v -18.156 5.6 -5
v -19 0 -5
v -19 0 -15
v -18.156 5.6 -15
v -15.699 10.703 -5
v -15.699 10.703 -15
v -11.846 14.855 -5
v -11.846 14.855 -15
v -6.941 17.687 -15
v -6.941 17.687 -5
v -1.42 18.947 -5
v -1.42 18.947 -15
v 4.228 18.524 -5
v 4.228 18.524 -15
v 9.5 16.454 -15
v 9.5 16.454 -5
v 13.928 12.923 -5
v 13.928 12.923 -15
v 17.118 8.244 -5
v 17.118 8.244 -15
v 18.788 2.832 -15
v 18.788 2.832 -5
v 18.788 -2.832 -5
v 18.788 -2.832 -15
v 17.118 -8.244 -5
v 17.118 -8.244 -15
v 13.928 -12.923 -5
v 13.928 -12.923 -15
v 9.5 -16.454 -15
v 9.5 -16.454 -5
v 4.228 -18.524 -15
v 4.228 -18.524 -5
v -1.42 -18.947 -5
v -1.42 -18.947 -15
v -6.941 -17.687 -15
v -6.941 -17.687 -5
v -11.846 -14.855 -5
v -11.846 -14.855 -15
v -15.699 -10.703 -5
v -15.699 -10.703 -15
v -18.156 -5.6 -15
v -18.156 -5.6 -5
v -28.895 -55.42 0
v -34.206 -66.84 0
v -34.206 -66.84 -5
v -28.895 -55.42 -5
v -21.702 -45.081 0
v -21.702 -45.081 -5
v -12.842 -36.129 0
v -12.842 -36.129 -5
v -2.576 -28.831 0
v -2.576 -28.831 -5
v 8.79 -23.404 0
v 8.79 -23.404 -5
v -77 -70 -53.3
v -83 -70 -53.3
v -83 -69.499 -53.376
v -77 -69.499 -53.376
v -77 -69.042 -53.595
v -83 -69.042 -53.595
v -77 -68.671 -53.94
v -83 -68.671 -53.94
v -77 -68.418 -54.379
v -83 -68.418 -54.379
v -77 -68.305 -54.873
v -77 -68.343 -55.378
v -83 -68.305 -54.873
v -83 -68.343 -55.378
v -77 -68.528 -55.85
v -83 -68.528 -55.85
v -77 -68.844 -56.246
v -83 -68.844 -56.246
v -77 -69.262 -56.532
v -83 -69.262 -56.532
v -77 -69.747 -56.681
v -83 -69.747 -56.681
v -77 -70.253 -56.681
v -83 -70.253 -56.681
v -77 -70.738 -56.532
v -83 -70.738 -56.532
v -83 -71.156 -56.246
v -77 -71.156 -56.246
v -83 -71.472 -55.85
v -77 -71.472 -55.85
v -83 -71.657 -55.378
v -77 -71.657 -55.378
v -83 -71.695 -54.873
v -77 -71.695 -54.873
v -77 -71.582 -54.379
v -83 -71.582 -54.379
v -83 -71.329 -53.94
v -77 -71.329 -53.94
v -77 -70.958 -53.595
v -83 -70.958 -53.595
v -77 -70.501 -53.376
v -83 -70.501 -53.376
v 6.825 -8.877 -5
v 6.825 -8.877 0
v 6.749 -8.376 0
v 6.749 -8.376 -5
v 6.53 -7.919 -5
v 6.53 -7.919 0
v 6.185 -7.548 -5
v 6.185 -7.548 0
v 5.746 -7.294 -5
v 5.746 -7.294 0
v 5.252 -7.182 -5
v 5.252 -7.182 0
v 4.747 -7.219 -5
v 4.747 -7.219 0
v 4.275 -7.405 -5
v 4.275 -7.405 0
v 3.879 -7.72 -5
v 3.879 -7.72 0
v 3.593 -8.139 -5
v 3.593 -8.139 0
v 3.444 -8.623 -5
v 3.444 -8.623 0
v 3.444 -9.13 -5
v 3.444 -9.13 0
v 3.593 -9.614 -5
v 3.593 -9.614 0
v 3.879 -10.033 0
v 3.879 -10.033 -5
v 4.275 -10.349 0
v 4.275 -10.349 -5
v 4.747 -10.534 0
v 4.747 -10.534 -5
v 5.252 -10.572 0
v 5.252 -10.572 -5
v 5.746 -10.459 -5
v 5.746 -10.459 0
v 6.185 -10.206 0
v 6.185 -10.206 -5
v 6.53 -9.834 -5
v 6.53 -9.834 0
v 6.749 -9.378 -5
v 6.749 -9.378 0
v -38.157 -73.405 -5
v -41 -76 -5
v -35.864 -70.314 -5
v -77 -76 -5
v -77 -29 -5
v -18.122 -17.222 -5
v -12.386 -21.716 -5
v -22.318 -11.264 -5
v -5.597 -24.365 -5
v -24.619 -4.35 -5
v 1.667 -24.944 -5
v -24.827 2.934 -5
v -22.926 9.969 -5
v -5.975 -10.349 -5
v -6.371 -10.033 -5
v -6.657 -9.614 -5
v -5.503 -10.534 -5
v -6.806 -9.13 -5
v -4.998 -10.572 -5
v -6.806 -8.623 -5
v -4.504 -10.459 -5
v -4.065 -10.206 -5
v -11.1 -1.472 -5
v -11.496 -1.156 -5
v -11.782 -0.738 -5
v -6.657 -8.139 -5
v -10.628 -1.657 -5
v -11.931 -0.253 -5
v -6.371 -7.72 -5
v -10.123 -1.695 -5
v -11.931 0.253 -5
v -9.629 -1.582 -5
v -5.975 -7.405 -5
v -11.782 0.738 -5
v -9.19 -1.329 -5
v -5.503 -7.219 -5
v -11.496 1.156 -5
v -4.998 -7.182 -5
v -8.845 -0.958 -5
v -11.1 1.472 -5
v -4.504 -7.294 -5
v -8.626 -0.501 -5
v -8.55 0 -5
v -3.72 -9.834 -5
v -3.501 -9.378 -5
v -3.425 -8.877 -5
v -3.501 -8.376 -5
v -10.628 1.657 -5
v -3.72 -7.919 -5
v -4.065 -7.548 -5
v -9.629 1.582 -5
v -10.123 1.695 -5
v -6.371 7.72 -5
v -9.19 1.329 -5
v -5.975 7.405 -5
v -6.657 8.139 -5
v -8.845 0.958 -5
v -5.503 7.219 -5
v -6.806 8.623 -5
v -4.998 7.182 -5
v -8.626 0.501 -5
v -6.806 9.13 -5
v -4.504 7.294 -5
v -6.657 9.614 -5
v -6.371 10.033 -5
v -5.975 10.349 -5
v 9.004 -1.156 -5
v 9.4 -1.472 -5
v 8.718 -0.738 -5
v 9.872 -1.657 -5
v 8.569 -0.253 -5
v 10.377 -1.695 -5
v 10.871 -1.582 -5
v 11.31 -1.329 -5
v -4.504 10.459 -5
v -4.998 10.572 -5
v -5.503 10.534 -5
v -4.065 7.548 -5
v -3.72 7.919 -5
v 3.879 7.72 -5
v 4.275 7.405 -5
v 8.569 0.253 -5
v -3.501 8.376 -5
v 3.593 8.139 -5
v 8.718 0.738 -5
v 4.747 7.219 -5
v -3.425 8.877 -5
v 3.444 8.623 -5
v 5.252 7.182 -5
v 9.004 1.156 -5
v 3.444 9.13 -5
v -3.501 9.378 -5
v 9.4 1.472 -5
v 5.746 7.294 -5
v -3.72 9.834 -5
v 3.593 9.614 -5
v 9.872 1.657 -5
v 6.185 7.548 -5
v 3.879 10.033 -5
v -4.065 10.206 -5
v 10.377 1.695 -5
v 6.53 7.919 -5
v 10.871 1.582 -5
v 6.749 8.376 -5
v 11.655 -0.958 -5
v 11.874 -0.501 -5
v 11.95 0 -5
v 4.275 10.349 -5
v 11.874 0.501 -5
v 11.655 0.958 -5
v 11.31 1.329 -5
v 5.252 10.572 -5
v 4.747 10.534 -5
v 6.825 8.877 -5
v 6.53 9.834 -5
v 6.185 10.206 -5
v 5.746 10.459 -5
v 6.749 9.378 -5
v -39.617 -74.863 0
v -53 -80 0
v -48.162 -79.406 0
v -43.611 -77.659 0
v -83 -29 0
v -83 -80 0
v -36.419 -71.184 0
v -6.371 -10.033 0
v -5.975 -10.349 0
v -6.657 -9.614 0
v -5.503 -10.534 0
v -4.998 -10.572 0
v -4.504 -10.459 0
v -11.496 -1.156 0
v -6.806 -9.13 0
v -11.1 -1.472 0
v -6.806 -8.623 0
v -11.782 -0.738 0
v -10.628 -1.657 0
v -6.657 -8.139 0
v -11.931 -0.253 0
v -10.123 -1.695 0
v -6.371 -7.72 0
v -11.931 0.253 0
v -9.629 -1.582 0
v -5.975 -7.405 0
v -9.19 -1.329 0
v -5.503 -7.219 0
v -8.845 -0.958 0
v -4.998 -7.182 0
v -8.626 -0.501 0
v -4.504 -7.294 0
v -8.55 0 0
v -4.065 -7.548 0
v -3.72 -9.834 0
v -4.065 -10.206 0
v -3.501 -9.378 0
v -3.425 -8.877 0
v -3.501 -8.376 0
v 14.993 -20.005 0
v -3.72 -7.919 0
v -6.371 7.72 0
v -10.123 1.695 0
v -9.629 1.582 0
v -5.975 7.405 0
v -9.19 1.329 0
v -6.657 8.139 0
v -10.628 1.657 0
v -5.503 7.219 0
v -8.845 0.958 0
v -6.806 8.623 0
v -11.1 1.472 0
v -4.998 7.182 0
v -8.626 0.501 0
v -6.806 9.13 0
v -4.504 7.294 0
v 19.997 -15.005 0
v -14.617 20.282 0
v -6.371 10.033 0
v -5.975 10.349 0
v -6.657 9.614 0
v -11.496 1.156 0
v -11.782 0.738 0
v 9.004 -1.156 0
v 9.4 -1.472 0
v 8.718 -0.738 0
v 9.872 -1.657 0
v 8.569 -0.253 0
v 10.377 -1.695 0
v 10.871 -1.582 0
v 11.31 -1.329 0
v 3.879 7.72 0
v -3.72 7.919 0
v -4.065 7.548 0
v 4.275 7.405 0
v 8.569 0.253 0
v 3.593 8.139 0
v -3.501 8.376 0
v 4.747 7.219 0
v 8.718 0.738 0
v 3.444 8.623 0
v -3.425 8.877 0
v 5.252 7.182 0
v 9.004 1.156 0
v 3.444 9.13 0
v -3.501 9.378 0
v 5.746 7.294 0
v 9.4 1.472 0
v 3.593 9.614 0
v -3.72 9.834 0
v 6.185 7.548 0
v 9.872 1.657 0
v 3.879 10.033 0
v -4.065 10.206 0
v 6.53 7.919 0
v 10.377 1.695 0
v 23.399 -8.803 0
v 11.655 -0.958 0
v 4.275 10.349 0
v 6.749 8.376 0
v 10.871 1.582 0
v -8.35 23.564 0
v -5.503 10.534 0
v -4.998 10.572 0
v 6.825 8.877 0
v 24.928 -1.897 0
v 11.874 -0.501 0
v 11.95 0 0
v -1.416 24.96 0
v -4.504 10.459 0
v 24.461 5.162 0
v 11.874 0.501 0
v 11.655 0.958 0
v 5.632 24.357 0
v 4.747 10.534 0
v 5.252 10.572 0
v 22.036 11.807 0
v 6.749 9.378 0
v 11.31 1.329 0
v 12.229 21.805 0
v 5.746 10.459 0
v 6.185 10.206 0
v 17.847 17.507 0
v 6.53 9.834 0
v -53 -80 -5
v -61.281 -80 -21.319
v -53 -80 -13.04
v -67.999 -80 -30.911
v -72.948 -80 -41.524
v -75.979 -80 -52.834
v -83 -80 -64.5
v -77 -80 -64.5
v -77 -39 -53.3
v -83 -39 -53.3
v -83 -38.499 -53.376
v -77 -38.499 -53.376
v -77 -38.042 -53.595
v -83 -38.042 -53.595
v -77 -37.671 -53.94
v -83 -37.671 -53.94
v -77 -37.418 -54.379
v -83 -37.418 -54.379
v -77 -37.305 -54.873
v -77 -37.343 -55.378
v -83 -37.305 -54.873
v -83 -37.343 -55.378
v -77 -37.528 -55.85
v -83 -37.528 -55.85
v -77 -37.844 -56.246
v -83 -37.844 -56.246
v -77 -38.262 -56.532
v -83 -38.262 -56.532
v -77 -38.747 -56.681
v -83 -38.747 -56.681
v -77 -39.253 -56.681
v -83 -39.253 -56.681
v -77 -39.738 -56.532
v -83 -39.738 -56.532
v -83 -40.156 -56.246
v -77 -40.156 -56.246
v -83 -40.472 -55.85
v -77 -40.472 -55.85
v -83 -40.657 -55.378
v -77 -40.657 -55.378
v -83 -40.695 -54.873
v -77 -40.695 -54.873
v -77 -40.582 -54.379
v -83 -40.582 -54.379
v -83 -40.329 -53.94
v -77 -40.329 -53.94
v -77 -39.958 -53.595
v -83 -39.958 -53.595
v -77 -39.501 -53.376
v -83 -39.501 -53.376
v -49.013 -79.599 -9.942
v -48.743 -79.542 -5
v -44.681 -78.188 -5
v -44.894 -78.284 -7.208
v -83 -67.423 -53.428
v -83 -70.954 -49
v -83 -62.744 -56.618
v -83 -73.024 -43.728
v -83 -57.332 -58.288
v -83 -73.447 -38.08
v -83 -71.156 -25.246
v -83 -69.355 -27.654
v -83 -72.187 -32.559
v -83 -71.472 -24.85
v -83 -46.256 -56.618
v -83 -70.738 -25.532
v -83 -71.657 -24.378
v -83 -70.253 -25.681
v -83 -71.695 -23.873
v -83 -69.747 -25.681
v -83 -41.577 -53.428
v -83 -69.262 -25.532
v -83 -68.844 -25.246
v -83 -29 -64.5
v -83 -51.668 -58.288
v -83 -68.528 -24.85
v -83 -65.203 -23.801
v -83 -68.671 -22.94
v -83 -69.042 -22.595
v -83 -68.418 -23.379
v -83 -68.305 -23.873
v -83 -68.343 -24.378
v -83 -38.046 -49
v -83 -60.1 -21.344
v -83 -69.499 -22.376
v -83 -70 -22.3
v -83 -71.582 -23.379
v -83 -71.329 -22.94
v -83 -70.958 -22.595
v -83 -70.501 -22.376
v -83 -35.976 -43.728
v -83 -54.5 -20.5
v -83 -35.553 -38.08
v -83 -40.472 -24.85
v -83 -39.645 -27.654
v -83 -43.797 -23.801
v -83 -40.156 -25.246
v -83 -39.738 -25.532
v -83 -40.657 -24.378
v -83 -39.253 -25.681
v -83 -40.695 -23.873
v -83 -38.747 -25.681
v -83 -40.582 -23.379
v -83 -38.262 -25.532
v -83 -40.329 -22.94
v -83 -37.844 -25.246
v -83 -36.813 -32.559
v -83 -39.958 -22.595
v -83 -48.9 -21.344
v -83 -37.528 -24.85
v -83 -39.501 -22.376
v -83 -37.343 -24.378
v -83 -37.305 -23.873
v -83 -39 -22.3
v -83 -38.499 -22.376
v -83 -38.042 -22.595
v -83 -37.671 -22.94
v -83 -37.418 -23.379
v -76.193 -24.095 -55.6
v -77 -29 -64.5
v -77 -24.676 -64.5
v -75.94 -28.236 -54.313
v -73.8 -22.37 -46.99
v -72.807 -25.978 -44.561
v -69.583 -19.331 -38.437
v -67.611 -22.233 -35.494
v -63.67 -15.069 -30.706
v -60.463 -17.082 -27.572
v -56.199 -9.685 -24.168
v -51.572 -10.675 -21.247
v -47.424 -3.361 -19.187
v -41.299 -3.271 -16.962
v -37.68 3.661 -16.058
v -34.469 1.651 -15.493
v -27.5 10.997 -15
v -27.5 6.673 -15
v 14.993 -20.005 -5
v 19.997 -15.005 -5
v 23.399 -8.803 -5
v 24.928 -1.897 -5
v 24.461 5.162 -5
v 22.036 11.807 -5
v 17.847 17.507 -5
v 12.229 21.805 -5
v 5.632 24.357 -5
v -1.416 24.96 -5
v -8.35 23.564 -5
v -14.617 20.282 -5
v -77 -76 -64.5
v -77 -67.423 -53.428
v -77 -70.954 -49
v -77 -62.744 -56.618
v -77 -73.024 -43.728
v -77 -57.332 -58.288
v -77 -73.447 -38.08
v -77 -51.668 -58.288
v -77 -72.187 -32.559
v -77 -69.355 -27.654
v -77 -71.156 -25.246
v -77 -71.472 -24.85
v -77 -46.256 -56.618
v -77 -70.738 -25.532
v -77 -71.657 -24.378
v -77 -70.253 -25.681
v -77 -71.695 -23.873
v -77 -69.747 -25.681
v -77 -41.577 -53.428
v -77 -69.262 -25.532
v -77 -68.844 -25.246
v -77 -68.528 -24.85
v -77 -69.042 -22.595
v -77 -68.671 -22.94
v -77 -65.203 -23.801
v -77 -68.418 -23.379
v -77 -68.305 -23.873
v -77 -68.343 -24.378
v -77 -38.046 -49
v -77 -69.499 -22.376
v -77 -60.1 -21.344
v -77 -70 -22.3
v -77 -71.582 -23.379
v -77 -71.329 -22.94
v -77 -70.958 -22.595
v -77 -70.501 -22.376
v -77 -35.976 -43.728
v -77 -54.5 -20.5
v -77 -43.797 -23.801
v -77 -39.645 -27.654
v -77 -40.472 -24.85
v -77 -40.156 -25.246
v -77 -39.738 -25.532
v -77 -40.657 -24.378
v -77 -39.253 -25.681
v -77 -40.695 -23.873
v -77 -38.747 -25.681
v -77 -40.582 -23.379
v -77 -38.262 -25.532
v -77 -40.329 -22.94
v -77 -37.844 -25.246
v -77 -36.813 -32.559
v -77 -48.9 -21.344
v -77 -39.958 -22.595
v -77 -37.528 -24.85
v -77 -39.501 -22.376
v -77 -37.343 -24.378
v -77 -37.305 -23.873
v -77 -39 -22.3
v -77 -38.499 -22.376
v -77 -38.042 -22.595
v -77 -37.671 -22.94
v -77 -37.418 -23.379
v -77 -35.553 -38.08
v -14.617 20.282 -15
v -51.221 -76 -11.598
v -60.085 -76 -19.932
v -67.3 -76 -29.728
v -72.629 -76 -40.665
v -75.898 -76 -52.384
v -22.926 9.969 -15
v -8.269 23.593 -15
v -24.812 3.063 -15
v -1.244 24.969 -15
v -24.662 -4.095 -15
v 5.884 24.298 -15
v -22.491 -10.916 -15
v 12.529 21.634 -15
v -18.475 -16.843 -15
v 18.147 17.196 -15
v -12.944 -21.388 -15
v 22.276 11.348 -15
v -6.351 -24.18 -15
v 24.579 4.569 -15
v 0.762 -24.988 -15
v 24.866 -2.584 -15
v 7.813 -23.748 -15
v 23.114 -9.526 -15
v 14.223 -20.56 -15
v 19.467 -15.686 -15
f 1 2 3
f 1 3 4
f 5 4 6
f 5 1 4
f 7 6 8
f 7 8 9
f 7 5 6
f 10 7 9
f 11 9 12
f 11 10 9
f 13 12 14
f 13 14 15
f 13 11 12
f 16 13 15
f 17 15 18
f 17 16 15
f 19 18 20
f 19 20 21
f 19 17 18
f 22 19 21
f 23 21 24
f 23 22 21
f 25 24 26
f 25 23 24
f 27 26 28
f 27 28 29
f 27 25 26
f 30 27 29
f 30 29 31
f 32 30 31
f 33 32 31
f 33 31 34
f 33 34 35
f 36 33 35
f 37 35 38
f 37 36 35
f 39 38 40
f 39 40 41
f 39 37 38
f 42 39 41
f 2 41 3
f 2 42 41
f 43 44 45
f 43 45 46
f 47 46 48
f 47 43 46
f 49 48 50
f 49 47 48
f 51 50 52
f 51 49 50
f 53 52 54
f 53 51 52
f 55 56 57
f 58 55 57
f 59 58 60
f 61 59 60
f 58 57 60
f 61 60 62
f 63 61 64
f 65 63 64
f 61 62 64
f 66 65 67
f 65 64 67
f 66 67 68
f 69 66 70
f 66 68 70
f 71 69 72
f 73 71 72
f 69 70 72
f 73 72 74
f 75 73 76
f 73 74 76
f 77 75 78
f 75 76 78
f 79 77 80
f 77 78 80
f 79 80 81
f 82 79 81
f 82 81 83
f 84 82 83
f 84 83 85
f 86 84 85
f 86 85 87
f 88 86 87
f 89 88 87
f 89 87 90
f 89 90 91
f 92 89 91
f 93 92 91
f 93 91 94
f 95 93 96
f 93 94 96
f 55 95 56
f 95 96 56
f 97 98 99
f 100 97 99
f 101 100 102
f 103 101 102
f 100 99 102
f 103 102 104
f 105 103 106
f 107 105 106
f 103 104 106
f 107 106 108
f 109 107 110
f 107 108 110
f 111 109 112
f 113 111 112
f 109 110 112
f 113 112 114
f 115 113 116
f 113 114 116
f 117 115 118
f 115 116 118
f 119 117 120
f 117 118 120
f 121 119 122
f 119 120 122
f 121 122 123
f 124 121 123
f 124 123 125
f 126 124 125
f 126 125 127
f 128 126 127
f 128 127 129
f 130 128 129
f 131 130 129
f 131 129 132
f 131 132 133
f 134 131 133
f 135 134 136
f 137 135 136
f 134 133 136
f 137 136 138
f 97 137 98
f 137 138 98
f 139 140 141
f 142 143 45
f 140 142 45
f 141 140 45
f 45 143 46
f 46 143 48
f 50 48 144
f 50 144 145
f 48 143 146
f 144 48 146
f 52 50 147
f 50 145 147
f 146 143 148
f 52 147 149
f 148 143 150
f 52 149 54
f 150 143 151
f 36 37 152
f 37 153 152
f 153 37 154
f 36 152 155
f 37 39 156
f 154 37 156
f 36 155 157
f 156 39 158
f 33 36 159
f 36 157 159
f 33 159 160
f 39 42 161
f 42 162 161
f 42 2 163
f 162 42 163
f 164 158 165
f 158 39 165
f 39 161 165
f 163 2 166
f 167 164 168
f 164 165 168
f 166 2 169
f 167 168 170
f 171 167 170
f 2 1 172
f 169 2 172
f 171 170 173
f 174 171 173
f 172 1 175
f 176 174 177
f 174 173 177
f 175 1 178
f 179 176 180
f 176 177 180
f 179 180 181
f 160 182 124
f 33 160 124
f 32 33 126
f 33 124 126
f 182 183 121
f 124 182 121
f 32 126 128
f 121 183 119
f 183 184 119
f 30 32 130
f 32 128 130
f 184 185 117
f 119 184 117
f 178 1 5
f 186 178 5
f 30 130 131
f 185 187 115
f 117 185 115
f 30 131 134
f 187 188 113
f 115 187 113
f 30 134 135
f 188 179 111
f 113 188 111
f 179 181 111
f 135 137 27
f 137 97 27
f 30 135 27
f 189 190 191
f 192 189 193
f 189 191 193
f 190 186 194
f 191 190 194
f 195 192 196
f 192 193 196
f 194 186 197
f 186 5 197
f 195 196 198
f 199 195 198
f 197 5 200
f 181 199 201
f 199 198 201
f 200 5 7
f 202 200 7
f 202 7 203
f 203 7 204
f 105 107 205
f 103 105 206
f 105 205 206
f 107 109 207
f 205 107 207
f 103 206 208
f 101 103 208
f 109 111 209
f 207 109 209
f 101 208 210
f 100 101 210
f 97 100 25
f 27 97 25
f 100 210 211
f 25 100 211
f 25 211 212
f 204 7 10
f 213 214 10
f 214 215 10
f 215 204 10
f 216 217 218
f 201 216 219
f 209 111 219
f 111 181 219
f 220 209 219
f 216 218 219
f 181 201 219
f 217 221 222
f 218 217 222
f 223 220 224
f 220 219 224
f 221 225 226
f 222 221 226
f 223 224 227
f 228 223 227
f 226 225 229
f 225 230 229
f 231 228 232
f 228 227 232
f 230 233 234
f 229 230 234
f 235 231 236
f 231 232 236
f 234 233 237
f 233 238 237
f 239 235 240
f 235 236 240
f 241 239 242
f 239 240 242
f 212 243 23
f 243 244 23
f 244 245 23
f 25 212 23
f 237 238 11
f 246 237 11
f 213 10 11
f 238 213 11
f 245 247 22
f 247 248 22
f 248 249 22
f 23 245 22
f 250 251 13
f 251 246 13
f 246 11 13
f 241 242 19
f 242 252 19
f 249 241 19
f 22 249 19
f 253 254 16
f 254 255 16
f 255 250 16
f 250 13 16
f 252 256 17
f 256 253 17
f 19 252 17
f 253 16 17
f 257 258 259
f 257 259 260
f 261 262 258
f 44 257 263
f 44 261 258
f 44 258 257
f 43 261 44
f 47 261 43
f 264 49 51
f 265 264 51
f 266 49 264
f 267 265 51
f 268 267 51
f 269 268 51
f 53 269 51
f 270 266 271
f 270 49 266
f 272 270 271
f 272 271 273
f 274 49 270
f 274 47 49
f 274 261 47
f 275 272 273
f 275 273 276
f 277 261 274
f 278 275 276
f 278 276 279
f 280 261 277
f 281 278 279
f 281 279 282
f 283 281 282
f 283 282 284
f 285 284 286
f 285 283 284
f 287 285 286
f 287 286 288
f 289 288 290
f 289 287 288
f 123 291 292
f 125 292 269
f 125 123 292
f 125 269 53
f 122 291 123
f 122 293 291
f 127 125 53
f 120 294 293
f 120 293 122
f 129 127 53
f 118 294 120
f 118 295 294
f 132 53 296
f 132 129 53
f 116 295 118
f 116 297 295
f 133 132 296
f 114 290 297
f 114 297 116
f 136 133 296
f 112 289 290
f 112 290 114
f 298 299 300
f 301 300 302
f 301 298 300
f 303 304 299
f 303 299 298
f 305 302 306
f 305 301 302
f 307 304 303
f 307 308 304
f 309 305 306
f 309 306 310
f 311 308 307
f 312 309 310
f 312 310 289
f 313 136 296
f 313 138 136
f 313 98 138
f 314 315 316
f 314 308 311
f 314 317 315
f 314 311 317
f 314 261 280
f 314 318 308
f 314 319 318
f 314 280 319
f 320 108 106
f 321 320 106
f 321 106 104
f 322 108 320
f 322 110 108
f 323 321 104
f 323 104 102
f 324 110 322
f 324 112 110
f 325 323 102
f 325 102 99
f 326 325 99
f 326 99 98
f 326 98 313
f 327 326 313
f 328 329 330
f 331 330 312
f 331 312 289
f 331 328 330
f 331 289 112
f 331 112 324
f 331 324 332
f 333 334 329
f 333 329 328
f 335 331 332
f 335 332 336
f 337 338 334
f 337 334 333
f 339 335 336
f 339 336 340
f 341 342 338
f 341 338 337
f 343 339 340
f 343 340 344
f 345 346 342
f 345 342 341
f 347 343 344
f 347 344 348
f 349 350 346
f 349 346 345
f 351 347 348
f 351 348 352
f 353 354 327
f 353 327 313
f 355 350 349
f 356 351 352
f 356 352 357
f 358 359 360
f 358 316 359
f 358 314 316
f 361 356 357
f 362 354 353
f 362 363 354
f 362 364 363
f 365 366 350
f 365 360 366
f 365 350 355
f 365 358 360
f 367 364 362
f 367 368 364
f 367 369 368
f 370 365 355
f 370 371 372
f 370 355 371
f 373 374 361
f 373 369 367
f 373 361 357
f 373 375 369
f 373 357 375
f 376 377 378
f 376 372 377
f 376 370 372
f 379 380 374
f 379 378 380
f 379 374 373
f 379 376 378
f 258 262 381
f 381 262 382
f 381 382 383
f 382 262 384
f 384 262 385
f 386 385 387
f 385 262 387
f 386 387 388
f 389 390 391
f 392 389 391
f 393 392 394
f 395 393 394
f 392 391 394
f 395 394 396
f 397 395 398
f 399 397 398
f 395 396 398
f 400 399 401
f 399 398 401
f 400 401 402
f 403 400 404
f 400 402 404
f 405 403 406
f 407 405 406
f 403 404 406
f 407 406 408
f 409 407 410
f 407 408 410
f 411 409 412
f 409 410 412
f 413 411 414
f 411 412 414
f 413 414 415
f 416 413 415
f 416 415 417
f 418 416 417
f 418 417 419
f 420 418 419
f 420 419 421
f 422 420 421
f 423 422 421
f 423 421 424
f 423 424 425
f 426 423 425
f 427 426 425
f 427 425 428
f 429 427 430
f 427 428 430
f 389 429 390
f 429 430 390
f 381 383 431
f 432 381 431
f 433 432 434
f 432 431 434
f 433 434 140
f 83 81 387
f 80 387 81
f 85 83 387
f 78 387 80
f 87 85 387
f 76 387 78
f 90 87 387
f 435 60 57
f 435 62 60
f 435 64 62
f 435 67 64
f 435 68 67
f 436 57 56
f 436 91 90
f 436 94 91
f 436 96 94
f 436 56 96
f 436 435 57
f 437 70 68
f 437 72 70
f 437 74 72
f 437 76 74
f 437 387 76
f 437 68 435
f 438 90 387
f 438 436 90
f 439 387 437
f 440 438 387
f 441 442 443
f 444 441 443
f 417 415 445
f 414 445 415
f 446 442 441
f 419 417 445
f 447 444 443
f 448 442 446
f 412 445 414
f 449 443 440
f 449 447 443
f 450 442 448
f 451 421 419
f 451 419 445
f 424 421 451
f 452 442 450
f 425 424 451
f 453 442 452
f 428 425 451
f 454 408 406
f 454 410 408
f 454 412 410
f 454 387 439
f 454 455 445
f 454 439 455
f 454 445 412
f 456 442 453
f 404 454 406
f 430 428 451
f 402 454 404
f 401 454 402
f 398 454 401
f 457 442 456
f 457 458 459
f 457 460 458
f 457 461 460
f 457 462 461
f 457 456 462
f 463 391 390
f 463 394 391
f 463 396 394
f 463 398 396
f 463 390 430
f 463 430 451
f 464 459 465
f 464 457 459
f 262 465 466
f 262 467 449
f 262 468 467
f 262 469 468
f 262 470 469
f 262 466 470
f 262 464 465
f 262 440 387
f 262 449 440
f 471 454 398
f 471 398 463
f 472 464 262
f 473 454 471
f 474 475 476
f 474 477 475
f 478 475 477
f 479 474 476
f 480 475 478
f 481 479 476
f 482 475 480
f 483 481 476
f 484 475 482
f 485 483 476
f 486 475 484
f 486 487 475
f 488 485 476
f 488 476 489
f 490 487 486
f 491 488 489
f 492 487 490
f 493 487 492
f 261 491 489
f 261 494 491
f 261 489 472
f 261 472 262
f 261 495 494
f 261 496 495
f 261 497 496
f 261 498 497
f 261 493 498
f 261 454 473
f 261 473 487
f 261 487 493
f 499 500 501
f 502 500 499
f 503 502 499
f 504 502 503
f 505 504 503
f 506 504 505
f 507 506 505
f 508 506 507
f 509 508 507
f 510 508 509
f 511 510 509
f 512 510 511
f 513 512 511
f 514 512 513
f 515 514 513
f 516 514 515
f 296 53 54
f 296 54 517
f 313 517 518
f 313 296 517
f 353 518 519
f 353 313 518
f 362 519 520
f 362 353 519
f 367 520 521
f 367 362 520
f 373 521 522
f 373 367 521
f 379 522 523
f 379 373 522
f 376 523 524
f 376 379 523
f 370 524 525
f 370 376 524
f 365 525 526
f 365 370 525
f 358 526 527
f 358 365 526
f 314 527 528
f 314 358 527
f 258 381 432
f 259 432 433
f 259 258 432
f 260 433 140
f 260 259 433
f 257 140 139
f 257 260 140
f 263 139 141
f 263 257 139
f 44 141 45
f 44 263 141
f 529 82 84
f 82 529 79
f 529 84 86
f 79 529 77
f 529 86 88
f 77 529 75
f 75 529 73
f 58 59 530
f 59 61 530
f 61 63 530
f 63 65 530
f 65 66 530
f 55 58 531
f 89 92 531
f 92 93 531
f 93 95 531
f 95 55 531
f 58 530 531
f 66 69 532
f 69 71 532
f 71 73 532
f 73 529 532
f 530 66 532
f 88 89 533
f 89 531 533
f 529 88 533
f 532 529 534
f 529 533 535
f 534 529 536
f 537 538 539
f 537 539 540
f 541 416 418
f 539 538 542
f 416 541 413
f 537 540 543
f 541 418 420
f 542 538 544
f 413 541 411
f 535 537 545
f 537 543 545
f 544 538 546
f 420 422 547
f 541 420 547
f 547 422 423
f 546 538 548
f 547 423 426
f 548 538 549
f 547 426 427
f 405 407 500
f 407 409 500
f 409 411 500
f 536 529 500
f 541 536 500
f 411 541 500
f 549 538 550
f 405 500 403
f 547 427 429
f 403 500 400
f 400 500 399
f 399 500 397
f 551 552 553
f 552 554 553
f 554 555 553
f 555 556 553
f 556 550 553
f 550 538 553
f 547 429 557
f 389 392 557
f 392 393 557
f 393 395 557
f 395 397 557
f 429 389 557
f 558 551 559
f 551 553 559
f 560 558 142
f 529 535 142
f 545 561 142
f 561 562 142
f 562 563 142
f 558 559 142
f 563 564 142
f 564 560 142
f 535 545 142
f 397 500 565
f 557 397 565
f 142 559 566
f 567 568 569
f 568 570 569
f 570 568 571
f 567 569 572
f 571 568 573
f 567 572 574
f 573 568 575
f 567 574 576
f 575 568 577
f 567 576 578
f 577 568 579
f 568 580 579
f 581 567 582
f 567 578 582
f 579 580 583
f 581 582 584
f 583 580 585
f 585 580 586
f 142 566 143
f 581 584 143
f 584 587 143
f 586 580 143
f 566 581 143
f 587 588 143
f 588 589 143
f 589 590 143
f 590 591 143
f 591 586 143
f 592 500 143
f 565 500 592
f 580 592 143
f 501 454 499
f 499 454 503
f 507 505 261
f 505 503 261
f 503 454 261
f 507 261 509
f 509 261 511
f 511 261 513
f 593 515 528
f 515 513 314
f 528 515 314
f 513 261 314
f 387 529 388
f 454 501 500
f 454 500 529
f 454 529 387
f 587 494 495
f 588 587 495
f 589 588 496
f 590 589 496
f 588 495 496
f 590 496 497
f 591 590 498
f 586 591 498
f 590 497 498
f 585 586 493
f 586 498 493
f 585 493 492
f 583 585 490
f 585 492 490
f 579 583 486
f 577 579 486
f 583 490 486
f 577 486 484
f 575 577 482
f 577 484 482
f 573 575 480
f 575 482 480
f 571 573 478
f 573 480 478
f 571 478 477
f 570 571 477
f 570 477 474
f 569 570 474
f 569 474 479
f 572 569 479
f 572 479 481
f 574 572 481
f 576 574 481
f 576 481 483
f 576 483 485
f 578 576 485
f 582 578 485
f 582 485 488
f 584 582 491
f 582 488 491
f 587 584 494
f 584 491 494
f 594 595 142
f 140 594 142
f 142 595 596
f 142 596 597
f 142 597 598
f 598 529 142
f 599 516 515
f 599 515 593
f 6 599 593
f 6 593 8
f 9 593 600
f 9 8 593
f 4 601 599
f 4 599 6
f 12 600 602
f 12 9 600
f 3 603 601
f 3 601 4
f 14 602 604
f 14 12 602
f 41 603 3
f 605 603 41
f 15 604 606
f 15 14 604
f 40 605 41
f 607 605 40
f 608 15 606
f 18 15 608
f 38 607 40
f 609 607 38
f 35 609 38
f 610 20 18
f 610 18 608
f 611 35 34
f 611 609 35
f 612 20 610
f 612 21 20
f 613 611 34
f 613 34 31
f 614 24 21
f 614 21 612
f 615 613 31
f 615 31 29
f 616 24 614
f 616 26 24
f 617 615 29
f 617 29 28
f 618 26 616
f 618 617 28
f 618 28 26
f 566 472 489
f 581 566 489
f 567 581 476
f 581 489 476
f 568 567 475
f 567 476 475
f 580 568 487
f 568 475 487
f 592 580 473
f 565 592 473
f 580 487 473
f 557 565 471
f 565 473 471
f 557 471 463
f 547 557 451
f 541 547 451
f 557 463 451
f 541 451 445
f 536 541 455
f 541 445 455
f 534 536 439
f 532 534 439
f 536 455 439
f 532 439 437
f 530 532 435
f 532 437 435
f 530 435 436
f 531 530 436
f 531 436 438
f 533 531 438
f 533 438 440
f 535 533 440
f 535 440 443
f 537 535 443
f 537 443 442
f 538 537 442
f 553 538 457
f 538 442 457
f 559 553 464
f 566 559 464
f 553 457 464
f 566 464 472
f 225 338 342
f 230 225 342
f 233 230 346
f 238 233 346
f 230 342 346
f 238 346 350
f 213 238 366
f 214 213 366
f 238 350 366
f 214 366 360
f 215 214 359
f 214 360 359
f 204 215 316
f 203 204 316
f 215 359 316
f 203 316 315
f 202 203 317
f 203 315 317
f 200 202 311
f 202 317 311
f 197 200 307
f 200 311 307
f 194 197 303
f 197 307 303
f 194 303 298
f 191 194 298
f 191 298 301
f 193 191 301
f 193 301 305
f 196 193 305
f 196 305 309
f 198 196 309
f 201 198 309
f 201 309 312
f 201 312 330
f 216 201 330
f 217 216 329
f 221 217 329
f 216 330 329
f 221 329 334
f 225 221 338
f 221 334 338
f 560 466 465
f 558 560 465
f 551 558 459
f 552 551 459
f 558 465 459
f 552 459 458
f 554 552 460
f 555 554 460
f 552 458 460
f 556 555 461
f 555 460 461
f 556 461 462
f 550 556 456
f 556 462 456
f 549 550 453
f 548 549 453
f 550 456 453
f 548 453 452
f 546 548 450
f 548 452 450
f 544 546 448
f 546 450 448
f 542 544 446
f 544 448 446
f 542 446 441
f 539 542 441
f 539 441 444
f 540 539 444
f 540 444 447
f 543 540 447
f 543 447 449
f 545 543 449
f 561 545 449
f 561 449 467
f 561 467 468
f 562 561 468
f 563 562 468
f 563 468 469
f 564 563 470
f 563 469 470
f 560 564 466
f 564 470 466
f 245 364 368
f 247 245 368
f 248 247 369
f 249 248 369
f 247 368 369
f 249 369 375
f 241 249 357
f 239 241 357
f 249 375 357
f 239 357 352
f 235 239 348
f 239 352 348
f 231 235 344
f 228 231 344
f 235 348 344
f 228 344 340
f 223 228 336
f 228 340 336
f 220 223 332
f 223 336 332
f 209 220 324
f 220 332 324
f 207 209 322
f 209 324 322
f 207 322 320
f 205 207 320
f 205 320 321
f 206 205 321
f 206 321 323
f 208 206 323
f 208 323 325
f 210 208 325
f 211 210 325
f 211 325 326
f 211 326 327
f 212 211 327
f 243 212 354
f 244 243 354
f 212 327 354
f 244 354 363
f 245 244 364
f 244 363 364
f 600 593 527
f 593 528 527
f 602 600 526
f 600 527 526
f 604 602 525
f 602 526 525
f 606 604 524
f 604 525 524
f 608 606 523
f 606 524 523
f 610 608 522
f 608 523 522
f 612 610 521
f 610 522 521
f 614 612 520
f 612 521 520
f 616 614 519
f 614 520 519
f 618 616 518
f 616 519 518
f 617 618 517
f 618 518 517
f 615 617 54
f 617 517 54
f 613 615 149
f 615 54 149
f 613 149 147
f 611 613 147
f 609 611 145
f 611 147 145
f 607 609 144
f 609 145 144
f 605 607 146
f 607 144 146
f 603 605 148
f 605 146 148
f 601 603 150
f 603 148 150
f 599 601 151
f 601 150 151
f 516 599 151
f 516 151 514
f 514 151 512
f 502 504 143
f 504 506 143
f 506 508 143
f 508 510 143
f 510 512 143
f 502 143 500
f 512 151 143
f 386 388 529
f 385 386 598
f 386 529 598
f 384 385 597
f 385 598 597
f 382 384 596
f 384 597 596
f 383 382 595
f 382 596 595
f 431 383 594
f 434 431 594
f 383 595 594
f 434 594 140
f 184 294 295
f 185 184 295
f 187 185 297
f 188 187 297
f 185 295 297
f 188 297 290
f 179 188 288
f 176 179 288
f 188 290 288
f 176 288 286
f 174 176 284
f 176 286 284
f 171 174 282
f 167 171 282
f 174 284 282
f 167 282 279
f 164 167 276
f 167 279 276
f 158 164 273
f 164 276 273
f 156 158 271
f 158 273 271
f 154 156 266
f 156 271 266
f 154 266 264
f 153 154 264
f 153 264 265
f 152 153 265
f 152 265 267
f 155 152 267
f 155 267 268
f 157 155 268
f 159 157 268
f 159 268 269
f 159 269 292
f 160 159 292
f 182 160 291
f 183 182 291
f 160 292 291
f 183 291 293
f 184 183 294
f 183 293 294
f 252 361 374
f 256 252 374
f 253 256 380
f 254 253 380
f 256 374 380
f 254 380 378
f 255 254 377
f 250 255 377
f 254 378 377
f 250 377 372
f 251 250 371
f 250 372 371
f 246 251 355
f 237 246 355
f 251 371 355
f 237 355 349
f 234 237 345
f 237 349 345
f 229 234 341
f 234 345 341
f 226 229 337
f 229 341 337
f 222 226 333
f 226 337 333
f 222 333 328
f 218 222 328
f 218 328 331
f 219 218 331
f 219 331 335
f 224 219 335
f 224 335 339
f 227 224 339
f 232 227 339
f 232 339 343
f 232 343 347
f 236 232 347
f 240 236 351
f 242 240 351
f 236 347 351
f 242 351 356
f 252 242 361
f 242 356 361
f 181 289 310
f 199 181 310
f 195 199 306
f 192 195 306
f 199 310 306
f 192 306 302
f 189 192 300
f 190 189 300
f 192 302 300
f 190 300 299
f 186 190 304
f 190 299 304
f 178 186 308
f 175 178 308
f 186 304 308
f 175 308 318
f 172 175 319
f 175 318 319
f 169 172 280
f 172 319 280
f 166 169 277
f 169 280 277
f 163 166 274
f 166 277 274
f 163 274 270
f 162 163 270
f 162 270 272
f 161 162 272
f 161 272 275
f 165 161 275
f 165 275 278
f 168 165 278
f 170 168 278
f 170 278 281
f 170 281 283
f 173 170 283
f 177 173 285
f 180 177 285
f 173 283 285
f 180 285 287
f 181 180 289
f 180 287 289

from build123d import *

# Parameters (mm, degrees)
SKIZZE1_R                        = 1.7
AUFSATZ_LINEAR_AUSTRAGEN1_DEPTH  = 5
SKIZZE14_R                       = 25
SKIZZE14_R_2                     = 19
AUFSATZ_LINEAR_AUSTRAGEN9_DEPTH  = 10
SKIZZE4_W                        = 59.5
SKIZZE4_H                        = 51
SKIZZE4_R                        = 1.7
SKIZZE4_R_2                      = 19
AUFSATZ_LINEAR_AUSTRAGEN4_DEPTH  = 6
AUFSATZ_LINEAR_START             = -64.5
AUFSATZ_LINEAR_AUSTRAGEN10_DEPTH = 59.5
AUFSATZ_LINEAR_AUSTRAGEN11_DEPTH = 59.5
SCHNITT_LINEAR_AUSTRAGEN4_DEPTH  = 146.774654862
SKIZZE19_R                       = 67.170138889
SCHNITT_LINEAR_AUSTRAGEN5_DEPTH  = 146.774654862


# Read off the part's stored shape, not the designer's step: Aufsatz-Linear austragen10
with BuildPart() as part:
    # Skizze1 → Aufsatz-Linear austragen1 (new body)
    with BuildSketch(Plane.XY):
        with BuildLine():
            Line((-83, -29), (-83, -80))
            Line((-83, -80), (-53, -80))
            ThreePointArc((-53, -80), (-41.528471273, -76.383040886), (-34.206147584, -66.840402867))
            ThreePointArc((-34.206147584, -66.840402867), (-17.465018587, -40.413653136), (8.789632026, -23.403896446))
            ThreePointArc((8.789632026, -23.403896446), (22.036349892, 11.806747369), (-14.616570826, 20.281909606))
            Line((-14.616570826, 20.281909606), (-83, -29))
        make_face()
        with Locations((10.25, 0)):
            Circle(SKIZZE1_R, mode=Mode.SUBTRACT)
        with Locations((5.125, -8.876760389)):
            Circle(SKIZZE1_R, mode=Mode.SUBTRACT)
        with Locations((-5.125, -8.876760389)):
            Circle(SKIZZE1_R, mode=Mode.SUBTRACT)
        with Locations((-10.25, 0)):
            Circle(SKIZZE1_R, mode=Mode.SUBTRACT)
        with Locations((-5.125, 8.876760389)):
            Circle(SKIZZE1_R, mode=Mode.SUBTRACT)
        with Locations((5.125, 8.876760389)):
            Circle(SKIZZE1_R, mode=Mode.SUBTRACT)
    extrude(amount=-AUFSATZ_LINEAR_AUSTRAGEN1_DEPTH)

    # Skizze14 → Aufsatz-Linear austragen9 (add)
    with BuildSketch(Plane(origin=(0, 0, -5), x_dir=(-1, 0, 0), z_dir=(0, 0, -1))):
        with Locations(Location((0, 0, 0), (0, 0, 249.415691324))):
            Circle(SKIZZE14_R)
        Circle(SKIZZE14_R_2, mode=Mode.SUBTRACT)
    extrude(amount=AUFSATZ_LINEAR_AUSTRAGEN9_DEPTH)

    # Skizze4 → Aufsatz-Linear austragen4 (add)
    with BuildSketch(Plane.ZY.offset(83)):
        with Locations((-34.75, -54.5)):
            Rectangle(SKIZZE4_W, SKIZZE4_H)
        with Locations((-24, -39)):
            Circle(SKIZZE4_R, mode=Mode.SUBTRACT)
        with Locations((-55, -39)):
            Circle(SKIZZE4_R, mode=Mode.SUBTRACT)
        with Locations((-55, -70)):
            Circle(SKIZZE4_R, mode=Mode.SUBTRACT)
        with Locations((-24, -70)):
            Circle(SKIZZE4_R, mode=Mode.SUBTRACT)
        with Locations((-39.5, -54.5)):
            Circle(SKIZZE4_R_2, mode=Mode.SUBTRACT)
    extrude(amount=-AUFSATZ_LINEAR_AUSTRAGEN4_DEPTH)

    # Aufsatz-Linear austragen10 outline → Aufsatz-Linear austragen10 (add)
    with BuildSketch(Plane.XY.offset(AUFSATZ_LINEAR_START)):
        with BuildLine():
            Line((-77, -76), (-77, -80))
            Line((-77, -80), (-53, -80))
            ThreePointArc((-53, -80), (-46.67544468, -78.973665961), (-41, -76))
            Line((-41, -76), (-77, -76))
        make_face()
    extrude(amount=AUFSATZ_LINEAR_AUSTRAGEN10_DEPTH)

    # Skizze16 → Aufsatz-Linear austragen11 (add)
    with BuildSketch(Plane(origin=(0, 0, -5), x_dir=(-1, 0, 0), z_dir=(0, 0, -1))):
        Polygon((83, -29), (14.616570826, 20.281909606), (12.565587056, 17.435970711), (77, -29), align=None)
    extrude(amount=AUFSATZ_LINEAR_AUSTRAGEN11_DEPTH)

    # Skizze18 → Schnitt-Linear austragen4 (cut, through all)
    with BuildSketch(Plane(origin=(0, -76, 0), x_dir=(1, 0, 0), z_dir=(0, 1, 0))):
        with BuildLine():
            Line((25, 15), (25, 103.581922368))
            Line((25, 103.581922368), (-57.878501345, 103.581922368))
            ThreePointArc((-57.878501345, 103.581922368), (-74.323098772, 48.442371863), (-27.5, 15))
            Line((-27.5, 15), (25, 15))
        make_face()
    extrude(amount=SCHNITT_LINEAR_AUSTRAGEN4_DEPTH, mode=Mode.SUBTRACT)

    # Skizze19 → Schnitt-Linear austragen5 (cut, through all)
    with BuildSketch(Plane(origin=(0, -76, 0), x_dir=(1, 0, 0), z_dir=(0, 1, 0))):
        with Locations((-9.829861111, 64.5)):
            Circle(SKIZZE19_R)
    extrude(amount=-SCHNITT_LINEAR_AUSTRAGEN5_DEPTH, mode=Mode.SUBTRACT)


solid = part.part
